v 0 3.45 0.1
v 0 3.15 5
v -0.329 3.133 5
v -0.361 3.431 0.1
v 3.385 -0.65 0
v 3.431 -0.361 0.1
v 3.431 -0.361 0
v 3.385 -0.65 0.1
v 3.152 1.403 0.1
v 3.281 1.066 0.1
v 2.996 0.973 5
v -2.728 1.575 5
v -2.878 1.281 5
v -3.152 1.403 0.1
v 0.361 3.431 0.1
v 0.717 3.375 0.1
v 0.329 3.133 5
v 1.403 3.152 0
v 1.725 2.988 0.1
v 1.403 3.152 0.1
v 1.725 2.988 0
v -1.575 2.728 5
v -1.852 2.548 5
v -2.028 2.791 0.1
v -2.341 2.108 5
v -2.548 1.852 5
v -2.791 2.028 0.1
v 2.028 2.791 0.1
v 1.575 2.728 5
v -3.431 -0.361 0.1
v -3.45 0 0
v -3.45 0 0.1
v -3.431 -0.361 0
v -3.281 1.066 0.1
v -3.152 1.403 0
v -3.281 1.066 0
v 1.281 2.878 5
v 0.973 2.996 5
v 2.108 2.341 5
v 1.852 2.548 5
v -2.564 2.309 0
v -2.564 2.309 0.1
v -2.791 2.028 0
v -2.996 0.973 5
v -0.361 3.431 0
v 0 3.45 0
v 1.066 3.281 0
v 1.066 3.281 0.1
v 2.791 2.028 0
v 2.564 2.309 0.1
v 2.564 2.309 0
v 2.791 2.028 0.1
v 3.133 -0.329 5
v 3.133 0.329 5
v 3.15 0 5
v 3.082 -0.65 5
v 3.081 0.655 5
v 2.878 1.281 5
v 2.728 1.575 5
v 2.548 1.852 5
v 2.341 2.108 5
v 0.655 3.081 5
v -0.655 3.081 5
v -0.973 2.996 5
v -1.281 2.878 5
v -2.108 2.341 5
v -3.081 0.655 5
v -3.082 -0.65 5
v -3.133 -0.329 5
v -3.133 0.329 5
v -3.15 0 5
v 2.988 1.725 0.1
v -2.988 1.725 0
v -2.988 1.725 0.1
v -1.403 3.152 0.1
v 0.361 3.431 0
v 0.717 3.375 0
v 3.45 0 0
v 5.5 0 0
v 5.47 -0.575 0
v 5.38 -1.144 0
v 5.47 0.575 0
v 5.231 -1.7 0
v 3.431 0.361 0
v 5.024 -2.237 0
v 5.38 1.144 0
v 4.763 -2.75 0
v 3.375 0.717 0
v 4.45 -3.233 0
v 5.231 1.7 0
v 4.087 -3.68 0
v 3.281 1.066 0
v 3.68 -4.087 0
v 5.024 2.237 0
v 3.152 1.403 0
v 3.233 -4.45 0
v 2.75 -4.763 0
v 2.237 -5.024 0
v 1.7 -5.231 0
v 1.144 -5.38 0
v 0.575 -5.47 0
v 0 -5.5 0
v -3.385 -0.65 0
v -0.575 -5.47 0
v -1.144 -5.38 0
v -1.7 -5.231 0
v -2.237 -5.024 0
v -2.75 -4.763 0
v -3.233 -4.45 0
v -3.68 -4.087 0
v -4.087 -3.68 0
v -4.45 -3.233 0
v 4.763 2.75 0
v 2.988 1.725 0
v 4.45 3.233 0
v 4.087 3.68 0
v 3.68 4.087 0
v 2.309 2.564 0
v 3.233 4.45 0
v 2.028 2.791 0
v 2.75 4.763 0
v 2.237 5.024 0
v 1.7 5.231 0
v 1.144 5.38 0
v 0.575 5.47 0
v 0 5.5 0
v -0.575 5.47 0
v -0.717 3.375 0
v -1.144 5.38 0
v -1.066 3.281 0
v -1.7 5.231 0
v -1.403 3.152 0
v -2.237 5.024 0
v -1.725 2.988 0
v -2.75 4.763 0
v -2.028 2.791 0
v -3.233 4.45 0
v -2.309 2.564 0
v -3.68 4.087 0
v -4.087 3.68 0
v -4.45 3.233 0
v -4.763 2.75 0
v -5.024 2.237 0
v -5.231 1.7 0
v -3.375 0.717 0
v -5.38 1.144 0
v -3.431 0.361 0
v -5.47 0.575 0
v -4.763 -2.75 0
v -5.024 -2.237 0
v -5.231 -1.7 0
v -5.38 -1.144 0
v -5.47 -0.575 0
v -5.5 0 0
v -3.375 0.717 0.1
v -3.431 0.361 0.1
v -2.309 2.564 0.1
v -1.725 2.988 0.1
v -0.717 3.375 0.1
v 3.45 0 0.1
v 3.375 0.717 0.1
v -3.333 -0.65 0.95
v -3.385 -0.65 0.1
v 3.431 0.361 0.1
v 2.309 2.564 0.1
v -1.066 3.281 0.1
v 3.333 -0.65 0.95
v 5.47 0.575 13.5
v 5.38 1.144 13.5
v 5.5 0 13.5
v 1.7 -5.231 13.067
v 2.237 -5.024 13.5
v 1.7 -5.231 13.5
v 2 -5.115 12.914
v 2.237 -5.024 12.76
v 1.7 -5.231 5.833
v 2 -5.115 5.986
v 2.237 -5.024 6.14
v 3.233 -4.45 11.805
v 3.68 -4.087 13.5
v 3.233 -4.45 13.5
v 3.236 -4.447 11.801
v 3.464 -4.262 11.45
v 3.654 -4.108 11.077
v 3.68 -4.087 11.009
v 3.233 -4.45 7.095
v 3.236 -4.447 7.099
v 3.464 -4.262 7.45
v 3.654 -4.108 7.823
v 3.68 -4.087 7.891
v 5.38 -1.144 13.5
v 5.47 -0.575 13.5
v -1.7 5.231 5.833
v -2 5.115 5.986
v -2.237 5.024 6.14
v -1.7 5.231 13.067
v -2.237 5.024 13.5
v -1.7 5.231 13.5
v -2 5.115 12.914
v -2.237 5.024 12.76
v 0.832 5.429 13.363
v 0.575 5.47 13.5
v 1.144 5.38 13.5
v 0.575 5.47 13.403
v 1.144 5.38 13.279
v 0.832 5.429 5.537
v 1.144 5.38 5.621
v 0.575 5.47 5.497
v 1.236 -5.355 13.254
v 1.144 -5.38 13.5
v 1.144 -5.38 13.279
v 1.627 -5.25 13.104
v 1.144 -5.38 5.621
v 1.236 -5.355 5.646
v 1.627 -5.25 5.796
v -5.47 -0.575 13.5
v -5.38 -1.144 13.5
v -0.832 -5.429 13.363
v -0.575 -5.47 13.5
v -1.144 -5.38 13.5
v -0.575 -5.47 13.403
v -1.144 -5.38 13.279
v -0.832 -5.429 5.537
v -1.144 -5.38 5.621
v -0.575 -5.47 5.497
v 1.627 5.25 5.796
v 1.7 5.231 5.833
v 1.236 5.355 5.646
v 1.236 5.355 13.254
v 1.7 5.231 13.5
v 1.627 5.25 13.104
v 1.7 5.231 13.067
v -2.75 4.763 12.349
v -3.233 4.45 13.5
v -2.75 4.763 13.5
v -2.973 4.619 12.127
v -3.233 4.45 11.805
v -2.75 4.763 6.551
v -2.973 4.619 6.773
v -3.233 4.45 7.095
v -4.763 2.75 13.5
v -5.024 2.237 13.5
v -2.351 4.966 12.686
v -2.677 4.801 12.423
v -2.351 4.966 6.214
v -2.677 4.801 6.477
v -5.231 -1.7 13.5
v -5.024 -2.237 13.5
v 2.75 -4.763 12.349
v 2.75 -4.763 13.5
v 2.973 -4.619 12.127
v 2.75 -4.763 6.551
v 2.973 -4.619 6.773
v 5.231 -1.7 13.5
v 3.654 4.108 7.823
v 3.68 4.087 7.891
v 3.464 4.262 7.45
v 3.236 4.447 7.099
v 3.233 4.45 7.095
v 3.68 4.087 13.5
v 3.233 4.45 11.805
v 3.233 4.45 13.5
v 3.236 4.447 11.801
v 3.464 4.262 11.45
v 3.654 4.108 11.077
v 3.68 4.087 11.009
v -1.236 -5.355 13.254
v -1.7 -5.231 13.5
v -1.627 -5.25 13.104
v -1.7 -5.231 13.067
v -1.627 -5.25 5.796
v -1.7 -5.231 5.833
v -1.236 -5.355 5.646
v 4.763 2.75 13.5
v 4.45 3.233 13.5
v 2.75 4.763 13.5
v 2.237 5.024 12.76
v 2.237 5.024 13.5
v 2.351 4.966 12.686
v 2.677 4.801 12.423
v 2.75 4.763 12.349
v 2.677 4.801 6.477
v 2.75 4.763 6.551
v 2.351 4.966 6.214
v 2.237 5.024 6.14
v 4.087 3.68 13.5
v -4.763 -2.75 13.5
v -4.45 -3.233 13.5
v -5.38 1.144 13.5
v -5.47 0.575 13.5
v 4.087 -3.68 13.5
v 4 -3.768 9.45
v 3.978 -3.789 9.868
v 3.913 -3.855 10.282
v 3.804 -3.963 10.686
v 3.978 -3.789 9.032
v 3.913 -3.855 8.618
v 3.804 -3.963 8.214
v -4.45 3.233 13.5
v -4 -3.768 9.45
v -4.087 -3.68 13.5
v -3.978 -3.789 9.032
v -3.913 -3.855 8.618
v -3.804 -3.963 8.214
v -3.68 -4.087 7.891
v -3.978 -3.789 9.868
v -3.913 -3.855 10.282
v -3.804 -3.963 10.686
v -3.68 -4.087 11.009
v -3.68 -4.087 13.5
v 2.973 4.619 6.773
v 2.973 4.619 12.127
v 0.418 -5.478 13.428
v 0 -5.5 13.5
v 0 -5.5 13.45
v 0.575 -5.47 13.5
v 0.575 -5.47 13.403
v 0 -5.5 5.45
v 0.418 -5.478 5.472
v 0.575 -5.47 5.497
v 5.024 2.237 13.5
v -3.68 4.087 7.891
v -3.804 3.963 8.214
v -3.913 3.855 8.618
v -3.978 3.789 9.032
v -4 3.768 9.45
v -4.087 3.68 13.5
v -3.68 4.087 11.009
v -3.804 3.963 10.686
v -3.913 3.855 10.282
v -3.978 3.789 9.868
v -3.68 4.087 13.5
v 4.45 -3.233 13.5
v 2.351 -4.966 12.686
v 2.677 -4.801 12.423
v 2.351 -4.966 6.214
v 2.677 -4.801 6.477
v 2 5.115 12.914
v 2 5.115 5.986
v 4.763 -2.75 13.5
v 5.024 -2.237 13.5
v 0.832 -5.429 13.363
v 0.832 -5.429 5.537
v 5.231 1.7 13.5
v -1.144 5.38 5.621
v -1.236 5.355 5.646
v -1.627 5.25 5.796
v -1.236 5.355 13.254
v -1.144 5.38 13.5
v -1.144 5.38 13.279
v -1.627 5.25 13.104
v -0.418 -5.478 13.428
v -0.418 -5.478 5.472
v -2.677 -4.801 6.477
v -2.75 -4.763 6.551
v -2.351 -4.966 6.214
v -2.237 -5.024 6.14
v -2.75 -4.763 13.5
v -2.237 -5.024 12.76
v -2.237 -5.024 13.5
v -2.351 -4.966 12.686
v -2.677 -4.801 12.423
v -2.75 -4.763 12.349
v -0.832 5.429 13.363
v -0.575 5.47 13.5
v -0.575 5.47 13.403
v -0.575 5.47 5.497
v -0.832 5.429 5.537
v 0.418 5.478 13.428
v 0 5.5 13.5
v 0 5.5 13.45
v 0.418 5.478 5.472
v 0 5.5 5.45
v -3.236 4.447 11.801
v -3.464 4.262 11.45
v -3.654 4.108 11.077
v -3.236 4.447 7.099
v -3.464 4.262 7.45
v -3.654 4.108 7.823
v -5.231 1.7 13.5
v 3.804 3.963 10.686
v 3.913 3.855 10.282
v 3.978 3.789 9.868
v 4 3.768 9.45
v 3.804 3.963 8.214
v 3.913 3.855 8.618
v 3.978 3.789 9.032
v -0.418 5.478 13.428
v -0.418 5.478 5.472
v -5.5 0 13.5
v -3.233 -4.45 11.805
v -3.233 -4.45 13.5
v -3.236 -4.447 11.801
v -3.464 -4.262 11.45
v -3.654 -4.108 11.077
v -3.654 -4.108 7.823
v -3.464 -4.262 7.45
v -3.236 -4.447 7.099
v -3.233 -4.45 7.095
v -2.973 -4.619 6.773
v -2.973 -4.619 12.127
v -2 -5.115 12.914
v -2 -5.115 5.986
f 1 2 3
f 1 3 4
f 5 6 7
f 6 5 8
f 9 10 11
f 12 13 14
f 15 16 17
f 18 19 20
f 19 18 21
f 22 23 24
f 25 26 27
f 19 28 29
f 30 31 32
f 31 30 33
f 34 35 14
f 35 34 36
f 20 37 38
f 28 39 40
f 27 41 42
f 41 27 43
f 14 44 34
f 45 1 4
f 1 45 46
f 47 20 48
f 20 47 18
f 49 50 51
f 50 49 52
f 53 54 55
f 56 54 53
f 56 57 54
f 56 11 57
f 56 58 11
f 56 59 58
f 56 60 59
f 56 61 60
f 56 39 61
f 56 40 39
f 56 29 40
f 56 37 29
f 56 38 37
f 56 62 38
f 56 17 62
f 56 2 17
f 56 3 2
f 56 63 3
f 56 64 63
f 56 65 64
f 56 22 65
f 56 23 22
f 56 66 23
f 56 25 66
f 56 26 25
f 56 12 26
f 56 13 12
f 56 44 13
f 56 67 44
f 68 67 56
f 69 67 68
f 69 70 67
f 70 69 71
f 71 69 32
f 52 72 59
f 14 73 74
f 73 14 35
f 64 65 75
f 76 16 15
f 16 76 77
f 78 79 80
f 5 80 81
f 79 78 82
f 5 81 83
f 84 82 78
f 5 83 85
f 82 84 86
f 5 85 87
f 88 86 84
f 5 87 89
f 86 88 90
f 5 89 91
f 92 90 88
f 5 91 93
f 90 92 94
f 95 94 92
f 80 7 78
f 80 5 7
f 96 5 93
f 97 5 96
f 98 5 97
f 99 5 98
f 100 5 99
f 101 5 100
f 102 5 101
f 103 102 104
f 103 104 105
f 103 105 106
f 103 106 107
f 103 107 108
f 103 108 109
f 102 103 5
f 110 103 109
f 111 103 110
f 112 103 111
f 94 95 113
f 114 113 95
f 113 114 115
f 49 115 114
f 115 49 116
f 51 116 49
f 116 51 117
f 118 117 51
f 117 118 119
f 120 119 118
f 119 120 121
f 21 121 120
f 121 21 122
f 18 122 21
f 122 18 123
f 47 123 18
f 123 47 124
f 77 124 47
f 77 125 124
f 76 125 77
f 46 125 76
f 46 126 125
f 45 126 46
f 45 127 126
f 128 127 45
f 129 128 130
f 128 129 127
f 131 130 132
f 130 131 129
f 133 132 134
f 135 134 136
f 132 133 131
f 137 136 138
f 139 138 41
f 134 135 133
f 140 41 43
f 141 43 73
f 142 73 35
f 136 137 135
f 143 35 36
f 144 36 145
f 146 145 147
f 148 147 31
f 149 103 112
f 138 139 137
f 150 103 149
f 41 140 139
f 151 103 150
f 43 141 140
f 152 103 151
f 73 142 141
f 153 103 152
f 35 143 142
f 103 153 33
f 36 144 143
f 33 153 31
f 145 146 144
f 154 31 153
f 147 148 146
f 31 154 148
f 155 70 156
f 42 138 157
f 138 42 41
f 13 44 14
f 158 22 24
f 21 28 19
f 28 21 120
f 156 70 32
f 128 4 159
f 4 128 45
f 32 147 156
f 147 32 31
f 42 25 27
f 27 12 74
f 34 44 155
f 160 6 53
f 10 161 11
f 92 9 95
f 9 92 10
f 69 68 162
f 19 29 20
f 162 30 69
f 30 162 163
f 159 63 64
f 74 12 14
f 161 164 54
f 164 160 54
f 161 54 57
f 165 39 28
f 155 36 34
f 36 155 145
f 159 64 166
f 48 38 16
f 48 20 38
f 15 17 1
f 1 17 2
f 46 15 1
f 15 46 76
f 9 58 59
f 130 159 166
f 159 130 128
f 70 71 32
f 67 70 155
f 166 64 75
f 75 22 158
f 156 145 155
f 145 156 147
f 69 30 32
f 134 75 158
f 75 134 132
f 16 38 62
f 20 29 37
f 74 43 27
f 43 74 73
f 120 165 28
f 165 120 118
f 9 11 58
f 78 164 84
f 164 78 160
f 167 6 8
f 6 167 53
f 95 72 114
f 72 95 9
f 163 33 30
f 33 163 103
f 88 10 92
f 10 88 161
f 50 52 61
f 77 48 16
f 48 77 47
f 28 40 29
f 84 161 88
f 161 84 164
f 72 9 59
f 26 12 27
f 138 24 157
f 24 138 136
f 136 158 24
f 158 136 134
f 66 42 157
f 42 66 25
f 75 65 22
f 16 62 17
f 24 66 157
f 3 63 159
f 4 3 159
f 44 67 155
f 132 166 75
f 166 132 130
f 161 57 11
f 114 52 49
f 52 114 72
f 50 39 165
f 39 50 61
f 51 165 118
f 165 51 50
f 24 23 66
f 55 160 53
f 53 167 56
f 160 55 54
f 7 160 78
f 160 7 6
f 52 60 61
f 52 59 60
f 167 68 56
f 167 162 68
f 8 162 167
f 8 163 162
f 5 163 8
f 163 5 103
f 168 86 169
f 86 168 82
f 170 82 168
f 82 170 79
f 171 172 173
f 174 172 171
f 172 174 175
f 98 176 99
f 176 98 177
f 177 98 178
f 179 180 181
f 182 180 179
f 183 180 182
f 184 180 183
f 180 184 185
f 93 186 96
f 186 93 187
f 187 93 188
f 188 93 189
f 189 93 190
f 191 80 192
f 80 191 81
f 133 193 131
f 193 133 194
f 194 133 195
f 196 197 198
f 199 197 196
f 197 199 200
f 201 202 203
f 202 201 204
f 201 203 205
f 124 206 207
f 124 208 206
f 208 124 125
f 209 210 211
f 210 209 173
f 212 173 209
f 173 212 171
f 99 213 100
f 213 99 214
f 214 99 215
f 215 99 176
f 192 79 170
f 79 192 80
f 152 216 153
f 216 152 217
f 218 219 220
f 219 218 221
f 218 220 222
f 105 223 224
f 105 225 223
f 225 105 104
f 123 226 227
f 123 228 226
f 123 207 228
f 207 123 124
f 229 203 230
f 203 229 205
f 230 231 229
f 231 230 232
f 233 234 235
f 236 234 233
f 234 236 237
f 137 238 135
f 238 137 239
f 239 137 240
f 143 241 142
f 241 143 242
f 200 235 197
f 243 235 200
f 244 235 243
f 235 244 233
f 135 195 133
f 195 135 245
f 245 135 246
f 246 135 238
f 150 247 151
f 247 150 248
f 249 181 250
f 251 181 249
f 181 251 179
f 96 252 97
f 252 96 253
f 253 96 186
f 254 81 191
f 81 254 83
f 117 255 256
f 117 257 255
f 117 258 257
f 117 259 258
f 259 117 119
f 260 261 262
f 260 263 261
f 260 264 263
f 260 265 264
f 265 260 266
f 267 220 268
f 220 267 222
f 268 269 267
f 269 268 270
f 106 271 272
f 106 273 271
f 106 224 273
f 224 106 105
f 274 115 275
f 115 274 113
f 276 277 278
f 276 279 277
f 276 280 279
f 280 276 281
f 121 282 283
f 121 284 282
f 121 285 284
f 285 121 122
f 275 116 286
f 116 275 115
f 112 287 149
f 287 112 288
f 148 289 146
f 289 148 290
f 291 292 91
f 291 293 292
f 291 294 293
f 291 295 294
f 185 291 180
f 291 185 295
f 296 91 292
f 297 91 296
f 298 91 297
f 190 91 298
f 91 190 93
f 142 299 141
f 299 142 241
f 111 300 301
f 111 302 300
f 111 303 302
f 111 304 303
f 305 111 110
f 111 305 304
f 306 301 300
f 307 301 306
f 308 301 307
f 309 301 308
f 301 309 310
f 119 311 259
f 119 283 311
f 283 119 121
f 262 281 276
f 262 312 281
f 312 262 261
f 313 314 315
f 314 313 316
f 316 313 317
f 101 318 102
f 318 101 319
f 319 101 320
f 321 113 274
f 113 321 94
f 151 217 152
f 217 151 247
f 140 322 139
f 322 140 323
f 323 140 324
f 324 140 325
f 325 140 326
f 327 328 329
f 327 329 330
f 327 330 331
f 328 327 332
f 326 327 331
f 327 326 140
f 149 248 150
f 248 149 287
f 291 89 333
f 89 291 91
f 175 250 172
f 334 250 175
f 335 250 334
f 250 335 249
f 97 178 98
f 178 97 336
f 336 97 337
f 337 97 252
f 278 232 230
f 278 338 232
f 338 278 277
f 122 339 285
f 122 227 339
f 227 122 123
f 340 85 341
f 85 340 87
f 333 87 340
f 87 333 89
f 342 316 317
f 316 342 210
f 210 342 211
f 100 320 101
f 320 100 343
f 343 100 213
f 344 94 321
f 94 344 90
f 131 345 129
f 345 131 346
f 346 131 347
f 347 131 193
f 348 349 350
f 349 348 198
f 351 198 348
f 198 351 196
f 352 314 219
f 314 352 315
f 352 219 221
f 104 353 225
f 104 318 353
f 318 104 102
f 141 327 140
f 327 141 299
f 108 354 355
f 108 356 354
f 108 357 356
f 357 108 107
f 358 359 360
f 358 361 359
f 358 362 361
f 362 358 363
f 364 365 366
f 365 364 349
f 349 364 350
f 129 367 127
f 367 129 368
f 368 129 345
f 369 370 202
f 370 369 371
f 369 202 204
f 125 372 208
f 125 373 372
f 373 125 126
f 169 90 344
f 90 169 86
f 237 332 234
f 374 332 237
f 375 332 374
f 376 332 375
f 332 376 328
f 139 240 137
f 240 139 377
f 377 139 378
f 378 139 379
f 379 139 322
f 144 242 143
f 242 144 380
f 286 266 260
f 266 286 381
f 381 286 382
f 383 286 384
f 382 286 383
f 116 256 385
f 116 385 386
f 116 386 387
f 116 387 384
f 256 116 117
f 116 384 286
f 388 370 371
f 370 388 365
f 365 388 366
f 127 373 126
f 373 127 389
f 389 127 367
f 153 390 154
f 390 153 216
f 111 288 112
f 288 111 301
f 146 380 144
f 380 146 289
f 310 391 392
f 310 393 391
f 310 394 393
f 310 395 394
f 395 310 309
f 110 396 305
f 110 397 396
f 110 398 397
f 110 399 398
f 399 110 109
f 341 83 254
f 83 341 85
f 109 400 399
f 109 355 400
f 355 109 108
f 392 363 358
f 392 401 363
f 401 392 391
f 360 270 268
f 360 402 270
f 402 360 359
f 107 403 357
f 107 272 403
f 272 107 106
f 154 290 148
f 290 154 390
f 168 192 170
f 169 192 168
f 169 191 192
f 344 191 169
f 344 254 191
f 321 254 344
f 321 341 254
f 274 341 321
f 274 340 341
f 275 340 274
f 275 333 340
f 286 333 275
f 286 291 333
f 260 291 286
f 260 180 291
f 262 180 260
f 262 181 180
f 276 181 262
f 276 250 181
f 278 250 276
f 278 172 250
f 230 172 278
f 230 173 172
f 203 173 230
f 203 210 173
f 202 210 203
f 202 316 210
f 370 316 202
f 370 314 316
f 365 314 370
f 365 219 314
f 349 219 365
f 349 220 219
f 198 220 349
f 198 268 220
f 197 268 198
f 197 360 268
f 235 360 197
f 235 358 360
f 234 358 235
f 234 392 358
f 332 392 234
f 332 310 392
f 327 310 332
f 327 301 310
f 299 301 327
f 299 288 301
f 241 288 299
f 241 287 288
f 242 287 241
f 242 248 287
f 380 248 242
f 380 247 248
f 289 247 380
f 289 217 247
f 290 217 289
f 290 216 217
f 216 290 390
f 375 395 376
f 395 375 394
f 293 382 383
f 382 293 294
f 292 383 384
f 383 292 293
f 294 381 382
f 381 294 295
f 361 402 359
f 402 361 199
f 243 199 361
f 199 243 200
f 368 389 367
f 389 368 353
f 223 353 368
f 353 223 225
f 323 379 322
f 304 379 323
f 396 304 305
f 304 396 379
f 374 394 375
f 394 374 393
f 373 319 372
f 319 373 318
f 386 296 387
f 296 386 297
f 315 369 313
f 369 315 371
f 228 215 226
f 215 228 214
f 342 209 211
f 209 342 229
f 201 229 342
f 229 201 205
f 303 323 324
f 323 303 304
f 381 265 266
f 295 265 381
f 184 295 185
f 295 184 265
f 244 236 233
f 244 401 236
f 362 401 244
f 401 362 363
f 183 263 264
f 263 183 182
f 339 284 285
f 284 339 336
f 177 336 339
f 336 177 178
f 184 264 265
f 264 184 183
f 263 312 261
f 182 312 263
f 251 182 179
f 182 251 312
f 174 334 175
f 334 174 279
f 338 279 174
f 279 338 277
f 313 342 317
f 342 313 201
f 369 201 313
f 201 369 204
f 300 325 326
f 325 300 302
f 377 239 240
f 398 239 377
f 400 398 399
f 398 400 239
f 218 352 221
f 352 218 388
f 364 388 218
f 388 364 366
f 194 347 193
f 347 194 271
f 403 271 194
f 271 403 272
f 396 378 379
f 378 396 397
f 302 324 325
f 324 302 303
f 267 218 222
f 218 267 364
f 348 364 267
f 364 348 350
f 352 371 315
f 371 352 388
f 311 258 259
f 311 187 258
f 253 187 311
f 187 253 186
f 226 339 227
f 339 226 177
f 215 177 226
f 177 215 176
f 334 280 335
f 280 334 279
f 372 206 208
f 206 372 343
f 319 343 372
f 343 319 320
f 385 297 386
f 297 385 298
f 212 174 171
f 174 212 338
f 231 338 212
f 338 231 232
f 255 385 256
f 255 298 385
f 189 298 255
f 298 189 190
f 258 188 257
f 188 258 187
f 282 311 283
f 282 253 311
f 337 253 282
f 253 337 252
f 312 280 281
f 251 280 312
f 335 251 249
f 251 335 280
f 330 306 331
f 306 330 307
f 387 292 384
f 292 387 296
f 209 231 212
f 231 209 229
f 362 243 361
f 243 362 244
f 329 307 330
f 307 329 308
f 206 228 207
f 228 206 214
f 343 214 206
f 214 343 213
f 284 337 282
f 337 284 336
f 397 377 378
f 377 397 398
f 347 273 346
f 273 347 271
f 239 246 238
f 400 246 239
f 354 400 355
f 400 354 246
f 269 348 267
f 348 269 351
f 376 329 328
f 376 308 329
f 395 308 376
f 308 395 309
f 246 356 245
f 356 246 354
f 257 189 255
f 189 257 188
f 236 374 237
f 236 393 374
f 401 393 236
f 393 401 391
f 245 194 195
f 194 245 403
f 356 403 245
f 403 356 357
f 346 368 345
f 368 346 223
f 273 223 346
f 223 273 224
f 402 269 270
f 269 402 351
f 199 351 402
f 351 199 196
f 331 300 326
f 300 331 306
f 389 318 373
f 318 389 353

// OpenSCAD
$fn = 60;

difference() {
    
    cylinder( h = 13.5, r = 5.5);

    // hole for the pot spindle
    intersection() {
        
        // create a tapered cylinder 
        hull() {
            translate([0,0,4.9]) cylinder(h = 0.1, r = 3.15);
            cylinder(h = 0.1, r = 3.45);
        }
        translate([-3.45,-0.65,0])
            cube([7,5,5]);
        
    }
    
    // magnet hole
    rotate(a = [90, 0, 0]) translate([0,9.45,-6])  cylinder(h = 12, r = 4);
}
